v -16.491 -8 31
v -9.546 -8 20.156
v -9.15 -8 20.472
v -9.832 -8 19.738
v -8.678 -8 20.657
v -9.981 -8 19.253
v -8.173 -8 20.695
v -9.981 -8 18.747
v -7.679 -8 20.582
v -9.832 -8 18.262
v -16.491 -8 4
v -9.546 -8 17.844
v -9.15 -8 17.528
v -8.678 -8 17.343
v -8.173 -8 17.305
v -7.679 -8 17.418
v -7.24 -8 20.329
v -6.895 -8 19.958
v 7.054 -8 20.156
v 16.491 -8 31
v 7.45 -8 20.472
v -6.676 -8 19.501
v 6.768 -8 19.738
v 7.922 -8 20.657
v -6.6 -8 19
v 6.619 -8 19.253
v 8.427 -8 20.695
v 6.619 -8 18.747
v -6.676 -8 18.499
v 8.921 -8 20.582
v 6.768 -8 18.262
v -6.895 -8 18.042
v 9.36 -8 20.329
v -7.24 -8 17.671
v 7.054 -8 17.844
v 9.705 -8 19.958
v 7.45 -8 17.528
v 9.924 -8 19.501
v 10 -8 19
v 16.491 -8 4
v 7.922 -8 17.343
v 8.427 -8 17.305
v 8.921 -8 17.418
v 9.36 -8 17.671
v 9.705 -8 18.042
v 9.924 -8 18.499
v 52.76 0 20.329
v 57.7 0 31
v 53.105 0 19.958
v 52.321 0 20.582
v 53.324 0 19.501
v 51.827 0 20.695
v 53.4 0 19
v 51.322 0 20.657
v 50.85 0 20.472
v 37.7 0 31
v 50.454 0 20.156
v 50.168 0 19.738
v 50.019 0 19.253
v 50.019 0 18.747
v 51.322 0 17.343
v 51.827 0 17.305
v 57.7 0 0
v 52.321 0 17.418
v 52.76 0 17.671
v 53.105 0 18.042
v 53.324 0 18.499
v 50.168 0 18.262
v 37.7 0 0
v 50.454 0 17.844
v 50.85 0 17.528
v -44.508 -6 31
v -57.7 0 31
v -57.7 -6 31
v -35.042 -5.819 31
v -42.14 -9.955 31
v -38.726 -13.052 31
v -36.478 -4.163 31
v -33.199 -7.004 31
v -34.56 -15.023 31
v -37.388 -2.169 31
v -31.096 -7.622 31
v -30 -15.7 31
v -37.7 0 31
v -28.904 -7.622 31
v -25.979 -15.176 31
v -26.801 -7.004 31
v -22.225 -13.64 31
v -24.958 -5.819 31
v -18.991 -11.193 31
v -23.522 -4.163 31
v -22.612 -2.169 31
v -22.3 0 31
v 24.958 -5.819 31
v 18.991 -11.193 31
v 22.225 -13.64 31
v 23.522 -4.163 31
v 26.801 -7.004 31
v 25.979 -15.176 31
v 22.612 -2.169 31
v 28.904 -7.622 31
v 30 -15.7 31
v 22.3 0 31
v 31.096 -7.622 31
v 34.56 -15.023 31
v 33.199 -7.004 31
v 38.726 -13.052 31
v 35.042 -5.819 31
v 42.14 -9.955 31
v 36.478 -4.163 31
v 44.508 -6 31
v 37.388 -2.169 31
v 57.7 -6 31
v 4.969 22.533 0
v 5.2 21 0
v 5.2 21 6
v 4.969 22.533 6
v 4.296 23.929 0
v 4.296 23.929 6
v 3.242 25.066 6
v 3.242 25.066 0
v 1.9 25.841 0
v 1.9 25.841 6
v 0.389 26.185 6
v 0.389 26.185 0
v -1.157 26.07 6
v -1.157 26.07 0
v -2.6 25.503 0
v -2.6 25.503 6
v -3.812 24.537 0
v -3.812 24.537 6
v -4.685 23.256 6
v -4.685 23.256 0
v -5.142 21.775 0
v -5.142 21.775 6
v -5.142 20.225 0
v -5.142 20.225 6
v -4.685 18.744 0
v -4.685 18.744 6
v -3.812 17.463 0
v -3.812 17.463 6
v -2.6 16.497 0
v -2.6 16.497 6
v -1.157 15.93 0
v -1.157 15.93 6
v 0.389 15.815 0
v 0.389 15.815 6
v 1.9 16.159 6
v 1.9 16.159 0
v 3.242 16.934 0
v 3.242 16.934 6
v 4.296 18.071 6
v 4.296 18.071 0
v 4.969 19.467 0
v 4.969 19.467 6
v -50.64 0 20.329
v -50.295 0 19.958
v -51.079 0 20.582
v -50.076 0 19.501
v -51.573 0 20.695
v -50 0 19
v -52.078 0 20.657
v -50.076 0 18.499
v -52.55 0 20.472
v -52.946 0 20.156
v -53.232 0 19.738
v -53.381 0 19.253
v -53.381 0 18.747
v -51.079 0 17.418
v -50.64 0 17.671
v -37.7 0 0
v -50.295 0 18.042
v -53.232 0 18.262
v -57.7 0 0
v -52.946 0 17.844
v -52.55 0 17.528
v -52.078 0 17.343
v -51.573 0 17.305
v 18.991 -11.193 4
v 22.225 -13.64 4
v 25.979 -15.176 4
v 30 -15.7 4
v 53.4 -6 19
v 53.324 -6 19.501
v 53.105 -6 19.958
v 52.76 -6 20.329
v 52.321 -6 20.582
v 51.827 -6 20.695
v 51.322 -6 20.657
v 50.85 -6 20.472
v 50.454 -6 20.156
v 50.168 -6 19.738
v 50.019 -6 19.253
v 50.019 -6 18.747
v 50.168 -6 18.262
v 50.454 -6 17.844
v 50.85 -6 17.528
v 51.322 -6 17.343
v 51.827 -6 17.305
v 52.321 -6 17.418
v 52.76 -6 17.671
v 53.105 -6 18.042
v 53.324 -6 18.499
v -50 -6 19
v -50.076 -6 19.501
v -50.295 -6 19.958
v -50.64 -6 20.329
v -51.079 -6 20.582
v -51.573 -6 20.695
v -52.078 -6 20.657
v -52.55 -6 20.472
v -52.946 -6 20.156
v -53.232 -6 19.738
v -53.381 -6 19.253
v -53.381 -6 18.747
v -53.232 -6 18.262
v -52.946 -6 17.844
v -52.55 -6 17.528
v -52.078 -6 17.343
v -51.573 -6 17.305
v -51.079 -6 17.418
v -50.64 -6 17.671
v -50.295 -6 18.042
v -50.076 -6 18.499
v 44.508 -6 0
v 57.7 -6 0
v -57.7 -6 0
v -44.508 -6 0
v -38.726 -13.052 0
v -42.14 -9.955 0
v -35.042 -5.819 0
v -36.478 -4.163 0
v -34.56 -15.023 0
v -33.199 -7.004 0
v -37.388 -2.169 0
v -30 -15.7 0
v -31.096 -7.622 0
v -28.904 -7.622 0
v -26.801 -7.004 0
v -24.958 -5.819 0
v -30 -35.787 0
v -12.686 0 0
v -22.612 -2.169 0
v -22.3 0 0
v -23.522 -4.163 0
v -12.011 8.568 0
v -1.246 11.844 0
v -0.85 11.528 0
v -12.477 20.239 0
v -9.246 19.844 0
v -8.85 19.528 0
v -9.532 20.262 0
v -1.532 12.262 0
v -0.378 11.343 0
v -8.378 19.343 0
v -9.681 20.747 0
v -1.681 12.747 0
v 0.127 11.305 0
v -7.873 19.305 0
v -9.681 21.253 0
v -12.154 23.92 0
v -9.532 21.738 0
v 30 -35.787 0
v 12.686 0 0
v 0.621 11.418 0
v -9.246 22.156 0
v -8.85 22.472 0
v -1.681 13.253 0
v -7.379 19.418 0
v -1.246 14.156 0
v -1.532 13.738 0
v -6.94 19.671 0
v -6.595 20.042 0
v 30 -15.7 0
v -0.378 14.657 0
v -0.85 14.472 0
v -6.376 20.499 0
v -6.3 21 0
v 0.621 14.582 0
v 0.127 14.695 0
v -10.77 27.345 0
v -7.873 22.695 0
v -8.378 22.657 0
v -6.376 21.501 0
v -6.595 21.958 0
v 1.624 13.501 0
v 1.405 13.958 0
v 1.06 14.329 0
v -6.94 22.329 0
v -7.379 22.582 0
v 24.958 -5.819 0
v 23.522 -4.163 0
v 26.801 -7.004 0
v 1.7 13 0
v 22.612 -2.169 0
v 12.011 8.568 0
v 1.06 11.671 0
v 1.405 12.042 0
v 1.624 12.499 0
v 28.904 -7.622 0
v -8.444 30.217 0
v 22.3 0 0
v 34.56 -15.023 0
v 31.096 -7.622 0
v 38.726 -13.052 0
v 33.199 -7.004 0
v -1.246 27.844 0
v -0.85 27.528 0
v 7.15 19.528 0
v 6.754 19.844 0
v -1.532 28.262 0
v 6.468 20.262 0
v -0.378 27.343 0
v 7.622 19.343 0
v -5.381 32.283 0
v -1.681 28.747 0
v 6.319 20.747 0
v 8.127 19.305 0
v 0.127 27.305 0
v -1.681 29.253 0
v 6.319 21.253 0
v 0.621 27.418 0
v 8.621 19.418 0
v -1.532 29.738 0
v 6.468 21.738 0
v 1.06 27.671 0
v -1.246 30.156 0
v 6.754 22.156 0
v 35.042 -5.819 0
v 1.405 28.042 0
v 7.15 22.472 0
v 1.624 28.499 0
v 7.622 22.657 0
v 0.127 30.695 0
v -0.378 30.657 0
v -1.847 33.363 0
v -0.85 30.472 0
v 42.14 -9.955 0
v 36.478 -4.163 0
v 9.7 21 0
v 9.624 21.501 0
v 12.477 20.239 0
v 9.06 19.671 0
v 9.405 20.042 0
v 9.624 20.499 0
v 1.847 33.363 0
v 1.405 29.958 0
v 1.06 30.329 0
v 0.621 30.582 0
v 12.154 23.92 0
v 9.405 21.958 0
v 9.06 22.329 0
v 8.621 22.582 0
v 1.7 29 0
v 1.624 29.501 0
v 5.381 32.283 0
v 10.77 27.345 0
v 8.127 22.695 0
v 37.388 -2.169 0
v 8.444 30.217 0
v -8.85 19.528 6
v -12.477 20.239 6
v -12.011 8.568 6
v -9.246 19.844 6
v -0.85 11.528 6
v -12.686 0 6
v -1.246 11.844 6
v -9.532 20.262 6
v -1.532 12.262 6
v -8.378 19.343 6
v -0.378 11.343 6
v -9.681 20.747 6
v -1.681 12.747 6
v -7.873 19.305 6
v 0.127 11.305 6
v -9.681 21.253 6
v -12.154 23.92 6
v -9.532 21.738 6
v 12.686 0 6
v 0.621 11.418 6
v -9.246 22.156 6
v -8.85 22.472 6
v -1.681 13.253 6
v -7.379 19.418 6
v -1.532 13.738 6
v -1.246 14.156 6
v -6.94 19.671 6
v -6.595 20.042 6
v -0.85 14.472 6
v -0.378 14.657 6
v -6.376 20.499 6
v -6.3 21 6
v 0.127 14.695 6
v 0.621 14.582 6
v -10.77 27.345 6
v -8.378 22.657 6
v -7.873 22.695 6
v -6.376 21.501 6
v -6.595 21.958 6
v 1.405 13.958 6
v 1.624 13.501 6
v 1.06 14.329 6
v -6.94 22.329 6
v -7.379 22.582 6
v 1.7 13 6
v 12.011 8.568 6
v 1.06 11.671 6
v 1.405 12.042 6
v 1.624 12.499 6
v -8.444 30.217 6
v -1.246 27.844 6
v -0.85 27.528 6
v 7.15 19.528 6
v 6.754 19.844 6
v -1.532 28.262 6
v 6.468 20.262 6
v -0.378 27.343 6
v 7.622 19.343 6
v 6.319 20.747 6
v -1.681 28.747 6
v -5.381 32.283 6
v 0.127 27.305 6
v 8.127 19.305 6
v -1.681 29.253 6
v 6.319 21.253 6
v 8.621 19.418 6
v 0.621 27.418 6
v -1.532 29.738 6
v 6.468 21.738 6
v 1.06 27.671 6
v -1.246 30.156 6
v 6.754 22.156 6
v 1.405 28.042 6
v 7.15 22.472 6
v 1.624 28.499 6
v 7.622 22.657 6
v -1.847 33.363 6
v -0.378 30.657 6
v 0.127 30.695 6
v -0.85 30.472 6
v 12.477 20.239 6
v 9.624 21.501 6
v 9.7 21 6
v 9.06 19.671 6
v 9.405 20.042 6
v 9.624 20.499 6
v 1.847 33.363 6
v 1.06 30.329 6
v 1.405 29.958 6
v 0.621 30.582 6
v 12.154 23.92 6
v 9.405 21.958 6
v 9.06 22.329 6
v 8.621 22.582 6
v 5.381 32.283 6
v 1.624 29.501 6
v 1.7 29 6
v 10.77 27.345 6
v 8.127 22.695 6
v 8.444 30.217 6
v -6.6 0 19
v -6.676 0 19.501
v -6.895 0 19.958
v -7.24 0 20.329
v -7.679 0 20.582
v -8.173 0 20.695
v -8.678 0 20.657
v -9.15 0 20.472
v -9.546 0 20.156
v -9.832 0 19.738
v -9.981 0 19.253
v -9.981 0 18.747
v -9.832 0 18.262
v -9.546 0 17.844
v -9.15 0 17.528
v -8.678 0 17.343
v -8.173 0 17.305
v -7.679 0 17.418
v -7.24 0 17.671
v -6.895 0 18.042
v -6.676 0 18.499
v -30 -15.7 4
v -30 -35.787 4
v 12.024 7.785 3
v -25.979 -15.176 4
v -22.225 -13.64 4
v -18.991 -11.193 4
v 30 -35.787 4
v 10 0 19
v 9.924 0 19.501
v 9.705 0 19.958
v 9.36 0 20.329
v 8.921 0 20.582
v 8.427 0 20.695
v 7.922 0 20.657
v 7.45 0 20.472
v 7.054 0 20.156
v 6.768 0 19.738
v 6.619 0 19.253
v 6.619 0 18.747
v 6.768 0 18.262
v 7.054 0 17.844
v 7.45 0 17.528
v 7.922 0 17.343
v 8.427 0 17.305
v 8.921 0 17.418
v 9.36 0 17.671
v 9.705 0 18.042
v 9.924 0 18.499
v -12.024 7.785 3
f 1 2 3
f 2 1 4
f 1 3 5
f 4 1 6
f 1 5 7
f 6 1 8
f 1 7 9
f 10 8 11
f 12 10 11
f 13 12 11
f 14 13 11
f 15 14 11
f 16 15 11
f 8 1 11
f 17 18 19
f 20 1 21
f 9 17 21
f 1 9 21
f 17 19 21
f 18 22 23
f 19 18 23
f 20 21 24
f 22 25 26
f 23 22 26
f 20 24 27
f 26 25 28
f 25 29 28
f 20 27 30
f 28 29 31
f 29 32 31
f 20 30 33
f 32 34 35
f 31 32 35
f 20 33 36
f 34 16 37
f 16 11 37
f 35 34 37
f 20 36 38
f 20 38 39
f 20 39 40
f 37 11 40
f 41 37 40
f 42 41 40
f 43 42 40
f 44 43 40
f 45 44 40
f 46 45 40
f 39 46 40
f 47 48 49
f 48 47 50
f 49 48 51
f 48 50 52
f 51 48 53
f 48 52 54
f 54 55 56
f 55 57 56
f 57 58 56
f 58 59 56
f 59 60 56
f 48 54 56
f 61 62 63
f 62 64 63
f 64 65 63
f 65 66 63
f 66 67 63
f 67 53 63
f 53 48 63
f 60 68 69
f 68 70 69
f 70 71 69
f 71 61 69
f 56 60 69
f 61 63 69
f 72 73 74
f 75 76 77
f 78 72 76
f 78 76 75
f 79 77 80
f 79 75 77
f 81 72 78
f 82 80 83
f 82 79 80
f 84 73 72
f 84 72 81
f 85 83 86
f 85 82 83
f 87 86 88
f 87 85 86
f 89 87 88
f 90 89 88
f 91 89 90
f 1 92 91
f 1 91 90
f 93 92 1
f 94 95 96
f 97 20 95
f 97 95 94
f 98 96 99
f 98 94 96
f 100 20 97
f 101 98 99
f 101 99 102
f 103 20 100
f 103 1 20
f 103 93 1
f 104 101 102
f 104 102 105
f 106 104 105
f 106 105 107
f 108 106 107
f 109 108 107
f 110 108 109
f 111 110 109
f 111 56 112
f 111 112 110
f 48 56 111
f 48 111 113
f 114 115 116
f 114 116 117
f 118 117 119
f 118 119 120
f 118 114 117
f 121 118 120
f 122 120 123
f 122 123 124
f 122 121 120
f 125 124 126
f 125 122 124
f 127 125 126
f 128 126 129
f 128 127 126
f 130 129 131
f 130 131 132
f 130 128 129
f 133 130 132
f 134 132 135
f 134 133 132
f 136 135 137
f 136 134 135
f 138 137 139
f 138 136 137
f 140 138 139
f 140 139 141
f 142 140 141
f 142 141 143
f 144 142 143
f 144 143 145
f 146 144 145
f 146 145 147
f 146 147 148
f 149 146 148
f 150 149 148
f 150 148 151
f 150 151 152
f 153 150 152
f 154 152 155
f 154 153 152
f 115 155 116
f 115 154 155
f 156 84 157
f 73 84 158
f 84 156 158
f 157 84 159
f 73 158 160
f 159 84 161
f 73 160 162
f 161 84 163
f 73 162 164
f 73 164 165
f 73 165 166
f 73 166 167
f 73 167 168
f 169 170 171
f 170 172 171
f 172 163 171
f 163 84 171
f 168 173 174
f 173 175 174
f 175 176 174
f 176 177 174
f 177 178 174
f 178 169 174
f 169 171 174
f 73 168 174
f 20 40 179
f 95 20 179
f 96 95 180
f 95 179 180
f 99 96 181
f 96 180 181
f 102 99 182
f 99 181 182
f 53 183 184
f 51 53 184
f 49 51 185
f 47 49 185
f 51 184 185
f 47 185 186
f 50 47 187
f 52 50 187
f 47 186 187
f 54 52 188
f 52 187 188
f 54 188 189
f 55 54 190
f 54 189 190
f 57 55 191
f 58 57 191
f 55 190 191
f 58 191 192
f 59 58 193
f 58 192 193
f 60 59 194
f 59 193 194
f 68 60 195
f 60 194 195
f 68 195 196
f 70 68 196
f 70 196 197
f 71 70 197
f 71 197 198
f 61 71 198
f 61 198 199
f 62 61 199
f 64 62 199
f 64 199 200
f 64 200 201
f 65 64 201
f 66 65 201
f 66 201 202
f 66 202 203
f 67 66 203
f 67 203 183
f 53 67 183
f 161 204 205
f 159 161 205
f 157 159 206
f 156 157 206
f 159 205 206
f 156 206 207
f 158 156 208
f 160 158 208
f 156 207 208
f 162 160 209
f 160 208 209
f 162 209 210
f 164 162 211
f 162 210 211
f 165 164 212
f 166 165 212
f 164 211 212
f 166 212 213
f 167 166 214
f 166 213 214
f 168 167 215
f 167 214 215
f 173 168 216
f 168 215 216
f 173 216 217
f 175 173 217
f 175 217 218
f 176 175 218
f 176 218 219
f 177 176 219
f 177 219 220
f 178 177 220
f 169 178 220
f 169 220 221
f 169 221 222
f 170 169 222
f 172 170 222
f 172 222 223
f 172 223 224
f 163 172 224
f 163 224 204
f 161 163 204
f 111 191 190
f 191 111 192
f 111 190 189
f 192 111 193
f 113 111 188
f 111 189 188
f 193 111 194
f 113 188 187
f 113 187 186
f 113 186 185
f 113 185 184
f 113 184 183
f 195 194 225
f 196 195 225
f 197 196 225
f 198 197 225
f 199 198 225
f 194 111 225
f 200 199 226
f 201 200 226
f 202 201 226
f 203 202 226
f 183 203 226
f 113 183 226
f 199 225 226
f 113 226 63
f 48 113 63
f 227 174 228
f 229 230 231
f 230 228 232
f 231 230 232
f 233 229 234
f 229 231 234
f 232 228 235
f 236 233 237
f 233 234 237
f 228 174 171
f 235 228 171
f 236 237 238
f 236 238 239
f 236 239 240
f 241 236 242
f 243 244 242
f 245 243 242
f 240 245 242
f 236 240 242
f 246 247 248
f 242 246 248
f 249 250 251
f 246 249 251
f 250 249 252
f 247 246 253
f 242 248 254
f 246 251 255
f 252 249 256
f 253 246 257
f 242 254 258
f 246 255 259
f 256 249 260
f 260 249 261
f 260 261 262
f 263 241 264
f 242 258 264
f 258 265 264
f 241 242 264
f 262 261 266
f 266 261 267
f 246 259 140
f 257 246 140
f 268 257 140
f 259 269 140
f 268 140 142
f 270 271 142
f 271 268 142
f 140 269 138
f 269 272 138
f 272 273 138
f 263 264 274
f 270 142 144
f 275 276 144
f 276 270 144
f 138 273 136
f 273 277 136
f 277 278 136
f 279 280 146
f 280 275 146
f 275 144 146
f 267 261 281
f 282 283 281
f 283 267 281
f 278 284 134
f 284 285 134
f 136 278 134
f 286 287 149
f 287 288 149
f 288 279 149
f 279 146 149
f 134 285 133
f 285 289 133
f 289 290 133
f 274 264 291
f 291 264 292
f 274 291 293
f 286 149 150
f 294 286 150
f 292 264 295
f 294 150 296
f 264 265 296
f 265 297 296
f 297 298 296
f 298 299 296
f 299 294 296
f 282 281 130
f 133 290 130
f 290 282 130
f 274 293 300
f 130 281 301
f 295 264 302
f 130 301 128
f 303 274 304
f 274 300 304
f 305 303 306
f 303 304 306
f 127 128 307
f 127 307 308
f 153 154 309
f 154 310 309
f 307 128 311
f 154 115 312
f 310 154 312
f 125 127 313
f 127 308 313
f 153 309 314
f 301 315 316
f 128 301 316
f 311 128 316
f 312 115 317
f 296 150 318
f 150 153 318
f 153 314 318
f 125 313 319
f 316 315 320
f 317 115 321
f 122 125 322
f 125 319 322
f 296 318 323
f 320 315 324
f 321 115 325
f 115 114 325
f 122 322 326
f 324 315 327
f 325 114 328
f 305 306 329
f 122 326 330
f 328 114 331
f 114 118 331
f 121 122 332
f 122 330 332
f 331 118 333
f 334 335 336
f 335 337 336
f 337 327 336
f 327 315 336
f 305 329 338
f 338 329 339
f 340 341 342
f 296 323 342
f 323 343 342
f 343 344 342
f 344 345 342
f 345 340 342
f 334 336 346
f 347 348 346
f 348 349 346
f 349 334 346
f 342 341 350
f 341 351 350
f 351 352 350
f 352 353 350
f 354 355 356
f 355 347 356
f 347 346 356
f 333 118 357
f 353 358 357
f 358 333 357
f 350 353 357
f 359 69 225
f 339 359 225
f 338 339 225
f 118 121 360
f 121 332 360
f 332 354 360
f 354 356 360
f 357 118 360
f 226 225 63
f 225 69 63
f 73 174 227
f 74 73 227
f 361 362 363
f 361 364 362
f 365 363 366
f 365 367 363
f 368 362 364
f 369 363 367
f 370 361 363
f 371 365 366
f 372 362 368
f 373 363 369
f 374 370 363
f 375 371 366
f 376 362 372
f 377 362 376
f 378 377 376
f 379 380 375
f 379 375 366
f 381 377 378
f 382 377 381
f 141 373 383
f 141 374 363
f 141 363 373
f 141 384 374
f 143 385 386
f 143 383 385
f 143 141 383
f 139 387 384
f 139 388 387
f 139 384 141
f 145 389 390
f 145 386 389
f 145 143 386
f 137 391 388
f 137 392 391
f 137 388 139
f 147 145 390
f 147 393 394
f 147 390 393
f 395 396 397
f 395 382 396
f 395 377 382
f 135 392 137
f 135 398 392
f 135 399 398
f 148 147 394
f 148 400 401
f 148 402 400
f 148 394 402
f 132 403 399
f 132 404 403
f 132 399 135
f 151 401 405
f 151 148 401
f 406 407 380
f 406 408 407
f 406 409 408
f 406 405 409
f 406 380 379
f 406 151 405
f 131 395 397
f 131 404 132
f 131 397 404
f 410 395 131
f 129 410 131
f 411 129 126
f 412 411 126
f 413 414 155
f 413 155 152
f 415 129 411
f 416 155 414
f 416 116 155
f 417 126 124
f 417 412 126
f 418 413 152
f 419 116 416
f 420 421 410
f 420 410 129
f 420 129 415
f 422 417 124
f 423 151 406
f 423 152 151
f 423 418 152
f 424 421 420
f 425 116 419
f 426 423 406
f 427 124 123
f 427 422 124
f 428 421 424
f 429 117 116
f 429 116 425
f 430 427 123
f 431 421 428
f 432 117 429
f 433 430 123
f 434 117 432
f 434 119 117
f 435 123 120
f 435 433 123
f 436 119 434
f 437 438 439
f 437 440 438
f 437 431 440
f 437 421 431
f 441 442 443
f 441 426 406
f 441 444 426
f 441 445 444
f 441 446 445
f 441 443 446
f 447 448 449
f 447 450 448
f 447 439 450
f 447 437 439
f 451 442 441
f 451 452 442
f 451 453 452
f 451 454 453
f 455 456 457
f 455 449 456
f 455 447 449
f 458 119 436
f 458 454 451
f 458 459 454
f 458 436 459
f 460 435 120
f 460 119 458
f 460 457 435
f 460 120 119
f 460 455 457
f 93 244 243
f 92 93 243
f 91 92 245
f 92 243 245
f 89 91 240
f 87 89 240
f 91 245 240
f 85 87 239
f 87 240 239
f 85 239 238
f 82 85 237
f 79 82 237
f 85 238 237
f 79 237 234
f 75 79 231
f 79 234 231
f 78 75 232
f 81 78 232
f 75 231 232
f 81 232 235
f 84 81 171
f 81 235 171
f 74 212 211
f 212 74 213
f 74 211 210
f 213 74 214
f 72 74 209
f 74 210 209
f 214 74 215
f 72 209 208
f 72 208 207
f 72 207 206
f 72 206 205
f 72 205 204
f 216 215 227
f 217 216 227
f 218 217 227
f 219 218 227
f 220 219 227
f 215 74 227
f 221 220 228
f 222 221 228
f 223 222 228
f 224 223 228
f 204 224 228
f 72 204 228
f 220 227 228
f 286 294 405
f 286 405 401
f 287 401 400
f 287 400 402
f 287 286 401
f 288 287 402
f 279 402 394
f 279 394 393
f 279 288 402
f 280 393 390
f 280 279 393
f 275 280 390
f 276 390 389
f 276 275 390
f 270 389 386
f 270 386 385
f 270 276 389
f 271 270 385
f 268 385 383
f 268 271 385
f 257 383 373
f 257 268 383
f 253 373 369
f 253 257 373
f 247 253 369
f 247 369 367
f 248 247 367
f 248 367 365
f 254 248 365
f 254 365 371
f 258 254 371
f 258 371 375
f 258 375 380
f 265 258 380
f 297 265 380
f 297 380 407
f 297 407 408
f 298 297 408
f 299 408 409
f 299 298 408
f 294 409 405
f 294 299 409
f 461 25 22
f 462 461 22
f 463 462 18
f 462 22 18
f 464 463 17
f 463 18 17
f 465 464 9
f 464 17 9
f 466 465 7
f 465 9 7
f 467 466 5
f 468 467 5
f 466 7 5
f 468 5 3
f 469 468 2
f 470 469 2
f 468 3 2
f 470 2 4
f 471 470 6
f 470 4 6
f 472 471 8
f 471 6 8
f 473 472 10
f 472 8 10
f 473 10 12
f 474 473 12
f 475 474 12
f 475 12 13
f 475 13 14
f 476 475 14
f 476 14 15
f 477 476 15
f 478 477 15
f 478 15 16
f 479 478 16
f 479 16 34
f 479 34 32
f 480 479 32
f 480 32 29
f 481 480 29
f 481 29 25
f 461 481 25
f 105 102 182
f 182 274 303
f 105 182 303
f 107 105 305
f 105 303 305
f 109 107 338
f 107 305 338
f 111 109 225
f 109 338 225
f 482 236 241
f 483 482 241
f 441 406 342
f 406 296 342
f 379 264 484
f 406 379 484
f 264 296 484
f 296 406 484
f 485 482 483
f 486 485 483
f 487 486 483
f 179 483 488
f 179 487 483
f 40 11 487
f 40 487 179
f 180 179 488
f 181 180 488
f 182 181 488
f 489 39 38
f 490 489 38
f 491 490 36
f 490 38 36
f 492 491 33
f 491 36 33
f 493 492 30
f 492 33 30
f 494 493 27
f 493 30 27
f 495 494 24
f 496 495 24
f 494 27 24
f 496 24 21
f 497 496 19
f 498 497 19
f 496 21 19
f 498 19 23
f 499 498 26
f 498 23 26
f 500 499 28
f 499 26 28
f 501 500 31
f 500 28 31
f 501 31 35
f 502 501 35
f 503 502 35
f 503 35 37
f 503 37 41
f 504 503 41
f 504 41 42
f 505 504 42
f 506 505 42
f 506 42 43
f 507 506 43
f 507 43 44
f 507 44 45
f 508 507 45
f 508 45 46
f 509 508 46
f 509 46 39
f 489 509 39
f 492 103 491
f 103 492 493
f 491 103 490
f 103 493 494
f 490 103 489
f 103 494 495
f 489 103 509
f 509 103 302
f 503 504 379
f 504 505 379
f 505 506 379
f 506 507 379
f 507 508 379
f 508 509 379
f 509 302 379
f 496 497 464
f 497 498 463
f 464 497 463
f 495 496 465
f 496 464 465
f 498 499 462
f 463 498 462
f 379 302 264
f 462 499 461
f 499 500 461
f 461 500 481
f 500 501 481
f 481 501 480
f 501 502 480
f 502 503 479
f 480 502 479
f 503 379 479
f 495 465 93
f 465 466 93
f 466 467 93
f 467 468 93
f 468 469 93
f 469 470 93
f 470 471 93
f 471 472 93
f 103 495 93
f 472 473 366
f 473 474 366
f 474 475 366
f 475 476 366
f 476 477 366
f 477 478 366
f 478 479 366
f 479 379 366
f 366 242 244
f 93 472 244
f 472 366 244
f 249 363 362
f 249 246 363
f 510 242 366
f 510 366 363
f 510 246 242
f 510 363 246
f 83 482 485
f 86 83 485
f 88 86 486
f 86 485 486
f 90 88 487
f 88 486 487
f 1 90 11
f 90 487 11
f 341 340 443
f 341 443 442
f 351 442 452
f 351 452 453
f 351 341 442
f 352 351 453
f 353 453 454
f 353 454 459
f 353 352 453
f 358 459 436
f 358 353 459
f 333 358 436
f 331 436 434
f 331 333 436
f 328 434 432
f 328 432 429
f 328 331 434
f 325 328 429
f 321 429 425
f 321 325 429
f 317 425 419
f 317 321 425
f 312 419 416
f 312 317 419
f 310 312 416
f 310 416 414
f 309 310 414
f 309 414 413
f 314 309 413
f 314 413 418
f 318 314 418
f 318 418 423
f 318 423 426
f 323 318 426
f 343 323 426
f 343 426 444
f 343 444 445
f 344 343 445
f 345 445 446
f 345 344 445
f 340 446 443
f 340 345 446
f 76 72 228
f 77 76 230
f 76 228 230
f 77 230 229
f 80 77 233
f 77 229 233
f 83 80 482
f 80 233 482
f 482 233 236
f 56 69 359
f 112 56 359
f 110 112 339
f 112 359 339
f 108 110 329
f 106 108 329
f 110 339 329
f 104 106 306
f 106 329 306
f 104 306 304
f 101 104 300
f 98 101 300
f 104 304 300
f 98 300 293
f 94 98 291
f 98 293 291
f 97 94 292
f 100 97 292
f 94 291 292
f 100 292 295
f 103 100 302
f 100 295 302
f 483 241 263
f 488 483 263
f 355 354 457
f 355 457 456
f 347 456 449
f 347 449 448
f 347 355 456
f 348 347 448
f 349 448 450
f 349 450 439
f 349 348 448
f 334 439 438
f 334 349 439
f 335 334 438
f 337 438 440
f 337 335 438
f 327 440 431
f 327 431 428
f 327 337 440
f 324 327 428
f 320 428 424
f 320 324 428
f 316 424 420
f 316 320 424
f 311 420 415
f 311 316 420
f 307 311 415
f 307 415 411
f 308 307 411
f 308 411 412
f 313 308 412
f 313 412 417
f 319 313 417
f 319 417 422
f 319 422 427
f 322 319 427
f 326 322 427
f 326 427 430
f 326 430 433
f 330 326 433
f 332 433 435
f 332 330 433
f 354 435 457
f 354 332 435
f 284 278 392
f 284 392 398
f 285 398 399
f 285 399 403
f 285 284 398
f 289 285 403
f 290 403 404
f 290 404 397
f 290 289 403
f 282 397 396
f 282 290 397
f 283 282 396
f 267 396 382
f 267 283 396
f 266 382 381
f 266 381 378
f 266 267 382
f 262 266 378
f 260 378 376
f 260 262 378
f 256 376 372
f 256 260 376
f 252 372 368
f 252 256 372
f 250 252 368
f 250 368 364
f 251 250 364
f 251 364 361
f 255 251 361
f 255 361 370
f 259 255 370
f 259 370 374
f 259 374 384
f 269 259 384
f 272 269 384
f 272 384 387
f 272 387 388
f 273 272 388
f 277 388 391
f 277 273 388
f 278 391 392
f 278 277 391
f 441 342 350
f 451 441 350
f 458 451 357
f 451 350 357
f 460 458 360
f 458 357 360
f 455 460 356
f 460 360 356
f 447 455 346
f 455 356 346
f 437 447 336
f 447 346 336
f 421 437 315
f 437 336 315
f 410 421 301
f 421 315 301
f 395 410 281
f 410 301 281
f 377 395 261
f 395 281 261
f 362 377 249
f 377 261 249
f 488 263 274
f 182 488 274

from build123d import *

# Parameters (mm, degrees)
F1_DEPTH = 31
F0_R     = 1.7
F0_R_2   = 5.2
F2_DEPTH = 6
F3_DEPTH = 4
F4_R     = 1.7
F5_DEPTH = 25


with BuildPart() as f1:
    # F0 (on Top) → F1 (new body)
    with BuildSketch(Plane.XY):
        with BuildLine():
            Line((12.6856816933, 0), (0, 0))
            Line((0, 0), (-12.6856816933, 0))
            Line((-12.6856816933, 0), (-22.3, 0))
            ThreePointArc((-22.3, 0), (-30, -7.7), (-37.7, 0))
            Line((-37.7, 0), (-45.7, 0))
            Line((-45.7, 0), (-57.7, 0))
            Line((-57.7, 0), (-57.7, -6))
            Line((-57.7, -6), (-44.5082735017, -6))
            ThreePointArc((-44.5082735017, -6), (-38.7261102445, -13.0516282509), (-30, -15.7))
            ThreePointArc((-30, -15.7), (-22.2253617447, -13.6398313773), (-16.4911140356, -8))
            Line((-16.4911140356, -8), (16.4911140356, -8))
            ThreePointArc((16.4911140356, -8), (22.2253617447, -13.6398313773), (30, -15.7))
            ThreePointArc((30, -15.7), (38.7261102445, -13.0516282509), (44.5082735017, -6))
            Line((44.5082735017, -6), (57.7, -6))
            Line((57.7, -6), (57.7, 0))
            Line((57.7, 0), (45.7, 0))
            Line((45.7, 0), (37.7, 0))
            ThreePointArc((37.7, 0), (30, -7.7), (22.3, 0))
            Line((22.3, 0), (12.6856816933, 0))
        make_face()
    extrude(amount=F1_DEPTH)

    # F0 (on Top) → F2 (join)
    with BuildSketch(Plane.XY):
        with BuildLine():
            Line((-12.6856816933, 0), (0, 0))
            Line((0, 0), (12.6856816933, 0))
            add(Edge.make_bspline(
                [(12.6856816933, 0), (12.3905999996, 2.441927908), (11.7188705001, 7.9681514968), (12.2103184435, 15.8432101865), (12.4767993137, 20.2387648954)],
                knots=[0, 0, 0, 0, 0.4418916914, 1, 1, 1, 1], degree=3))
            ThreePointArc((12.4767993137, 20.2387648954), (0, 33.5), (-12.4767993137, 20.2387648954))
            add(Edge.make_bspline(
                [(-12.6856816933, 0), (-12.3905999996, 2.441927908), (-11.7188705001, 7.9681514968), (-12.2103184435, 15.8432101865), (-12.4767993137, 20.2387648954)],
                knots=[0, 0, 0, 0, 0.4418916914, 1, 1, 1, 1], degree=3))
        make_face()
        with Locations((-8, 21)):
            Circle(F0_R, mode=Mode.SUBTRACT)
        with Locations((0, 13)):
            Circle(F0_R, mode=Mode.SUBTRACT)
        with Locations((0, 21)):
            Circle(F0_R_2, mode=Mode.SUBTRACT)
        with Locations((8, 21)):
            Circle(F0_R, mode=Mode.SUBTRACT)
        with Locations((0, 29)):
            Circle(F0_R, mode=Mode.SUBTRACT)
    extrude(amount=F2_DEPTH)

    # F0 (on Top) → F3 (join)
    with BuildSketch(Plane.XY):
        with BuildLine():
            ThreePointArc((-16.4911140356, -8), (-22.2253617447, -13.6398313773), (-30, -15.7))
            Line((-30, -15.7), (-30, -35.7866361737))
            Line((-30, -35.7866361737), (30, -35.7866361737))
            Line((30, -35.7866361737), (30, -15.7))
            ThreePointArc((30, -15.7), (22.2253617447, -13.6398313773), (16.4911140356, -8))
            Line((16.4911140356, -8), (-16.4911140356, -8))
        make_face()
    extrude(amount=F3_DEPTH)

    # F4 (on face) → F5 (cut)
    with BuildSketch(Plane.XZ.offset(8)):
        with Locations((-51.7, 19)):
            Circle(F4_R)
        with Locations((-8.3, 19)):
            Circle(F4_R)
        with Locations((8.3, 19)):
            Circle(F4_R)
        with Locations((51.7, 19)):
            Circle(F4_R)
    extrude(amount=-F5_DEPTH, mode=Mode.SUBTRACT)


solid = f1.part
